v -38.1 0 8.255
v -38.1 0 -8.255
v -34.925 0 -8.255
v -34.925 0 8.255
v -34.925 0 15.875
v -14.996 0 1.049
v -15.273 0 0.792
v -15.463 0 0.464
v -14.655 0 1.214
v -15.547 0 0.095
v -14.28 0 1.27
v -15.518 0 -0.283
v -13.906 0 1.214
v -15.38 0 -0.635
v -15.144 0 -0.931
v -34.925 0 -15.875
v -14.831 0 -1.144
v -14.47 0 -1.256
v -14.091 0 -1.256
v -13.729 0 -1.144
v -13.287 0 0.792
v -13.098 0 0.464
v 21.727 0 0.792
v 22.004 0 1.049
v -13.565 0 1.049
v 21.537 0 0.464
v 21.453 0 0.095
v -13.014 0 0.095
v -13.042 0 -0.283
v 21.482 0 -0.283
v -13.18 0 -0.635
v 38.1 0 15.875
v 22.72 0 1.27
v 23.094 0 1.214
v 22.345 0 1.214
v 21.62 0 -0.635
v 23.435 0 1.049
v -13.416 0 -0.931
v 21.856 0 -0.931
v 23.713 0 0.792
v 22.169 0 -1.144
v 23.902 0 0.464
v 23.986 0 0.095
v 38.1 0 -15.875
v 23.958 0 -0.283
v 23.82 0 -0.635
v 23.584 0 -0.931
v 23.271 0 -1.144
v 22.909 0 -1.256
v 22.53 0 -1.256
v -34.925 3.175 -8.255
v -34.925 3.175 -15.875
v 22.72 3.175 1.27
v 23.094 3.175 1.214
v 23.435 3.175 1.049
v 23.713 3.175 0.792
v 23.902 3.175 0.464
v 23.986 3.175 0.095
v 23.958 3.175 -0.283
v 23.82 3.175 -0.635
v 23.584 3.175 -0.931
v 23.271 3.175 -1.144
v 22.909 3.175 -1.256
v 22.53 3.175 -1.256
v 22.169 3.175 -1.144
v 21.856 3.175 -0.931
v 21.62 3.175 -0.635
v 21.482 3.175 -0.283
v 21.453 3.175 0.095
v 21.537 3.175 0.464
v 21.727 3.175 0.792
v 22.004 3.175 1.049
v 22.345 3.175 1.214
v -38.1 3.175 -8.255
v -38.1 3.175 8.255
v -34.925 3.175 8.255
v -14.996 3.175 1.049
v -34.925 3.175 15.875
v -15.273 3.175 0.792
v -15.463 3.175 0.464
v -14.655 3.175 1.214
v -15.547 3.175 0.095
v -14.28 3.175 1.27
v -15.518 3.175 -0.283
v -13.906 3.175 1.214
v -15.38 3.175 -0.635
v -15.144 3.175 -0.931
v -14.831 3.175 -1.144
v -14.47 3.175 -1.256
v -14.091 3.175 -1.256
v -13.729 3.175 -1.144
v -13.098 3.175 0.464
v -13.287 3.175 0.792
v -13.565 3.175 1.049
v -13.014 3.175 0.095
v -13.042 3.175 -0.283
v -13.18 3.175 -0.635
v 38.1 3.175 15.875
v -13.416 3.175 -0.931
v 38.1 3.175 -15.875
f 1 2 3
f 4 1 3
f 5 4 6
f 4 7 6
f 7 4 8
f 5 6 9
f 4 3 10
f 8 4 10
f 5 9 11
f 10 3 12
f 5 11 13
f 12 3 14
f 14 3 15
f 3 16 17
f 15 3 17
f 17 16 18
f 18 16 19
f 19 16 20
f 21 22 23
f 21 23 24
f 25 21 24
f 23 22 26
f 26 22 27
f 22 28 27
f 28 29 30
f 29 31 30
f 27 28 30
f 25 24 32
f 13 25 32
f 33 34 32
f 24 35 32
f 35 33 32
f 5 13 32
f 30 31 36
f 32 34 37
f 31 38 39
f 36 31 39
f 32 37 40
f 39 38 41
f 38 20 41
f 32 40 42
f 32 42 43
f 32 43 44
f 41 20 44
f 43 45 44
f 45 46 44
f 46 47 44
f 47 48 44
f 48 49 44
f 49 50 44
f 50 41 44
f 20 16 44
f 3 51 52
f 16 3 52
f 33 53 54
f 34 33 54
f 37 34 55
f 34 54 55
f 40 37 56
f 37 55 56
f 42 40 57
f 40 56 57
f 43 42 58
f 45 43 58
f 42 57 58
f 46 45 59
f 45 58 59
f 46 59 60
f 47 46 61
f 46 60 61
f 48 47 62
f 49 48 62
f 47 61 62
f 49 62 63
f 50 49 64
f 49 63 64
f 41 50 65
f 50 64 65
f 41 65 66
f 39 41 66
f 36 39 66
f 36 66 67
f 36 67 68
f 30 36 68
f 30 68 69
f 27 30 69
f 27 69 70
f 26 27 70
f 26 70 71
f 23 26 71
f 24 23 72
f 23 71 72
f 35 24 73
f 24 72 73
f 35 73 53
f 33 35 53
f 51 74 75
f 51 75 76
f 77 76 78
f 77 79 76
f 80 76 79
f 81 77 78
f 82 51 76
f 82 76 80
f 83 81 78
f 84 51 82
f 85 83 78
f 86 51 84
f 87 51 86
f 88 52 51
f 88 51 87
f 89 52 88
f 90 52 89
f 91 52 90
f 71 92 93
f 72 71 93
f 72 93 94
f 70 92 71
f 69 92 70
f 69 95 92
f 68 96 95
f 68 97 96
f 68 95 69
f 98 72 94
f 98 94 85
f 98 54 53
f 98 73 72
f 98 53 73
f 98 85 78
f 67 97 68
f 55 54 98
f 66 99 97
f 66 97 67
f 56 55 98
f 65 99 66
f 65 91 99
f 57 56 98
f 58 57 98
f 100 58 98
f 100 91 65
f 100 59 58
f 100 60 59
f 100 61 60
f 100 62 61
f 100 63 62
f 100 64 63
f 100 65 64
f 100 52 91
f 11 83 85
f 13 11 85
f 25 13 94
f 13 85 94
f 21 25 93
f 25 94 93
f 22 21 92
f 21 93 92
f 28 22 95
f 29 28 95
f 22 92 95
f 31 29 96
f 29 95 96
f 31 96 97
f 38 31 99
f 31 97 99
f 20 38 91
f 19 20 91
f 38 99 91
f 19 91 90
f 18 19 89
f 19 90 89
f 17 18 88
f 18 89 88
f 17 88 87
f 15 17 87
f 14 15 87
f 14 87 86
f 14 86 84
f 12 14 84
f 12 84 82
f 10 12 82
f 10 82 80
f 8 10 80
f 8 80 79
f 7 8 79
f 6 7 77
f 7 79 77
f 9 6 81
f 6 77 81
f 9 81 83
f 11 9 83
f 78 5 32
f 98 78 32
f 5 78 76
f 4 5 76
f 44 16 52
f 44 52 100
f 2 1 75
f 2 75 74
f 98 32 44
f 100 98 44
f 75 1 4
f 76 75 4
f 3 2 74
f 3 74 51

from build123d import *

# Parameters (mm, degrees)
SKETCH1_W           = 76.2
SKETCH1_H           = 31.75
BOSS_EXTRUDE1_DEPTH = 3.175
SKETCH2_R           = 1.27
SKETCH2_W           = 3.175
SKETCH2_H           = 7.62
CUT_EXTRUDE1_DEPTH  = 3.175


with BuildPart() as part:
    # Sketch1 → Boss-Extrude1 (new body)
    with BuildSketch(Plane(origin=(0, 0, 0), x_dir=(1, 0, 0), z_dir=(0, 1, 0))):
        Rectangle(SKETCH1_W, SKETCH1_H)
    extrude(amount=BOSS_EXTRUDE1_DEPTH)

    # Sketch2 → Cut-Extrude1 (cut)
    with BuildSketch(Plane(origin=(0, 3.175, 0), x_dir=(1, 0, 0), z_dir=(0, 1, 0))):
        with Locations(Location((-14.280312521, 0, 0), (0, 0, 270))):
            Circle(SKETCH2_R)
        with Locations(Location((22.719687479, 0, 0), (0, 0, 270))):
            Circle(SKETCH2_R)
        with Locations((-36.5125, 12.065)):
            Rectangle(SKETCH2_W, SKETCH2_H)
        with Locations((-36.5125, -12.065)):
            Rectangle(SKETCH2_W, SKETCH2_H)
    extrude(amount=-CUT_EXTRUDE1_DEPTH, mode=Mode.SUBTRACT)


solid = part.part
